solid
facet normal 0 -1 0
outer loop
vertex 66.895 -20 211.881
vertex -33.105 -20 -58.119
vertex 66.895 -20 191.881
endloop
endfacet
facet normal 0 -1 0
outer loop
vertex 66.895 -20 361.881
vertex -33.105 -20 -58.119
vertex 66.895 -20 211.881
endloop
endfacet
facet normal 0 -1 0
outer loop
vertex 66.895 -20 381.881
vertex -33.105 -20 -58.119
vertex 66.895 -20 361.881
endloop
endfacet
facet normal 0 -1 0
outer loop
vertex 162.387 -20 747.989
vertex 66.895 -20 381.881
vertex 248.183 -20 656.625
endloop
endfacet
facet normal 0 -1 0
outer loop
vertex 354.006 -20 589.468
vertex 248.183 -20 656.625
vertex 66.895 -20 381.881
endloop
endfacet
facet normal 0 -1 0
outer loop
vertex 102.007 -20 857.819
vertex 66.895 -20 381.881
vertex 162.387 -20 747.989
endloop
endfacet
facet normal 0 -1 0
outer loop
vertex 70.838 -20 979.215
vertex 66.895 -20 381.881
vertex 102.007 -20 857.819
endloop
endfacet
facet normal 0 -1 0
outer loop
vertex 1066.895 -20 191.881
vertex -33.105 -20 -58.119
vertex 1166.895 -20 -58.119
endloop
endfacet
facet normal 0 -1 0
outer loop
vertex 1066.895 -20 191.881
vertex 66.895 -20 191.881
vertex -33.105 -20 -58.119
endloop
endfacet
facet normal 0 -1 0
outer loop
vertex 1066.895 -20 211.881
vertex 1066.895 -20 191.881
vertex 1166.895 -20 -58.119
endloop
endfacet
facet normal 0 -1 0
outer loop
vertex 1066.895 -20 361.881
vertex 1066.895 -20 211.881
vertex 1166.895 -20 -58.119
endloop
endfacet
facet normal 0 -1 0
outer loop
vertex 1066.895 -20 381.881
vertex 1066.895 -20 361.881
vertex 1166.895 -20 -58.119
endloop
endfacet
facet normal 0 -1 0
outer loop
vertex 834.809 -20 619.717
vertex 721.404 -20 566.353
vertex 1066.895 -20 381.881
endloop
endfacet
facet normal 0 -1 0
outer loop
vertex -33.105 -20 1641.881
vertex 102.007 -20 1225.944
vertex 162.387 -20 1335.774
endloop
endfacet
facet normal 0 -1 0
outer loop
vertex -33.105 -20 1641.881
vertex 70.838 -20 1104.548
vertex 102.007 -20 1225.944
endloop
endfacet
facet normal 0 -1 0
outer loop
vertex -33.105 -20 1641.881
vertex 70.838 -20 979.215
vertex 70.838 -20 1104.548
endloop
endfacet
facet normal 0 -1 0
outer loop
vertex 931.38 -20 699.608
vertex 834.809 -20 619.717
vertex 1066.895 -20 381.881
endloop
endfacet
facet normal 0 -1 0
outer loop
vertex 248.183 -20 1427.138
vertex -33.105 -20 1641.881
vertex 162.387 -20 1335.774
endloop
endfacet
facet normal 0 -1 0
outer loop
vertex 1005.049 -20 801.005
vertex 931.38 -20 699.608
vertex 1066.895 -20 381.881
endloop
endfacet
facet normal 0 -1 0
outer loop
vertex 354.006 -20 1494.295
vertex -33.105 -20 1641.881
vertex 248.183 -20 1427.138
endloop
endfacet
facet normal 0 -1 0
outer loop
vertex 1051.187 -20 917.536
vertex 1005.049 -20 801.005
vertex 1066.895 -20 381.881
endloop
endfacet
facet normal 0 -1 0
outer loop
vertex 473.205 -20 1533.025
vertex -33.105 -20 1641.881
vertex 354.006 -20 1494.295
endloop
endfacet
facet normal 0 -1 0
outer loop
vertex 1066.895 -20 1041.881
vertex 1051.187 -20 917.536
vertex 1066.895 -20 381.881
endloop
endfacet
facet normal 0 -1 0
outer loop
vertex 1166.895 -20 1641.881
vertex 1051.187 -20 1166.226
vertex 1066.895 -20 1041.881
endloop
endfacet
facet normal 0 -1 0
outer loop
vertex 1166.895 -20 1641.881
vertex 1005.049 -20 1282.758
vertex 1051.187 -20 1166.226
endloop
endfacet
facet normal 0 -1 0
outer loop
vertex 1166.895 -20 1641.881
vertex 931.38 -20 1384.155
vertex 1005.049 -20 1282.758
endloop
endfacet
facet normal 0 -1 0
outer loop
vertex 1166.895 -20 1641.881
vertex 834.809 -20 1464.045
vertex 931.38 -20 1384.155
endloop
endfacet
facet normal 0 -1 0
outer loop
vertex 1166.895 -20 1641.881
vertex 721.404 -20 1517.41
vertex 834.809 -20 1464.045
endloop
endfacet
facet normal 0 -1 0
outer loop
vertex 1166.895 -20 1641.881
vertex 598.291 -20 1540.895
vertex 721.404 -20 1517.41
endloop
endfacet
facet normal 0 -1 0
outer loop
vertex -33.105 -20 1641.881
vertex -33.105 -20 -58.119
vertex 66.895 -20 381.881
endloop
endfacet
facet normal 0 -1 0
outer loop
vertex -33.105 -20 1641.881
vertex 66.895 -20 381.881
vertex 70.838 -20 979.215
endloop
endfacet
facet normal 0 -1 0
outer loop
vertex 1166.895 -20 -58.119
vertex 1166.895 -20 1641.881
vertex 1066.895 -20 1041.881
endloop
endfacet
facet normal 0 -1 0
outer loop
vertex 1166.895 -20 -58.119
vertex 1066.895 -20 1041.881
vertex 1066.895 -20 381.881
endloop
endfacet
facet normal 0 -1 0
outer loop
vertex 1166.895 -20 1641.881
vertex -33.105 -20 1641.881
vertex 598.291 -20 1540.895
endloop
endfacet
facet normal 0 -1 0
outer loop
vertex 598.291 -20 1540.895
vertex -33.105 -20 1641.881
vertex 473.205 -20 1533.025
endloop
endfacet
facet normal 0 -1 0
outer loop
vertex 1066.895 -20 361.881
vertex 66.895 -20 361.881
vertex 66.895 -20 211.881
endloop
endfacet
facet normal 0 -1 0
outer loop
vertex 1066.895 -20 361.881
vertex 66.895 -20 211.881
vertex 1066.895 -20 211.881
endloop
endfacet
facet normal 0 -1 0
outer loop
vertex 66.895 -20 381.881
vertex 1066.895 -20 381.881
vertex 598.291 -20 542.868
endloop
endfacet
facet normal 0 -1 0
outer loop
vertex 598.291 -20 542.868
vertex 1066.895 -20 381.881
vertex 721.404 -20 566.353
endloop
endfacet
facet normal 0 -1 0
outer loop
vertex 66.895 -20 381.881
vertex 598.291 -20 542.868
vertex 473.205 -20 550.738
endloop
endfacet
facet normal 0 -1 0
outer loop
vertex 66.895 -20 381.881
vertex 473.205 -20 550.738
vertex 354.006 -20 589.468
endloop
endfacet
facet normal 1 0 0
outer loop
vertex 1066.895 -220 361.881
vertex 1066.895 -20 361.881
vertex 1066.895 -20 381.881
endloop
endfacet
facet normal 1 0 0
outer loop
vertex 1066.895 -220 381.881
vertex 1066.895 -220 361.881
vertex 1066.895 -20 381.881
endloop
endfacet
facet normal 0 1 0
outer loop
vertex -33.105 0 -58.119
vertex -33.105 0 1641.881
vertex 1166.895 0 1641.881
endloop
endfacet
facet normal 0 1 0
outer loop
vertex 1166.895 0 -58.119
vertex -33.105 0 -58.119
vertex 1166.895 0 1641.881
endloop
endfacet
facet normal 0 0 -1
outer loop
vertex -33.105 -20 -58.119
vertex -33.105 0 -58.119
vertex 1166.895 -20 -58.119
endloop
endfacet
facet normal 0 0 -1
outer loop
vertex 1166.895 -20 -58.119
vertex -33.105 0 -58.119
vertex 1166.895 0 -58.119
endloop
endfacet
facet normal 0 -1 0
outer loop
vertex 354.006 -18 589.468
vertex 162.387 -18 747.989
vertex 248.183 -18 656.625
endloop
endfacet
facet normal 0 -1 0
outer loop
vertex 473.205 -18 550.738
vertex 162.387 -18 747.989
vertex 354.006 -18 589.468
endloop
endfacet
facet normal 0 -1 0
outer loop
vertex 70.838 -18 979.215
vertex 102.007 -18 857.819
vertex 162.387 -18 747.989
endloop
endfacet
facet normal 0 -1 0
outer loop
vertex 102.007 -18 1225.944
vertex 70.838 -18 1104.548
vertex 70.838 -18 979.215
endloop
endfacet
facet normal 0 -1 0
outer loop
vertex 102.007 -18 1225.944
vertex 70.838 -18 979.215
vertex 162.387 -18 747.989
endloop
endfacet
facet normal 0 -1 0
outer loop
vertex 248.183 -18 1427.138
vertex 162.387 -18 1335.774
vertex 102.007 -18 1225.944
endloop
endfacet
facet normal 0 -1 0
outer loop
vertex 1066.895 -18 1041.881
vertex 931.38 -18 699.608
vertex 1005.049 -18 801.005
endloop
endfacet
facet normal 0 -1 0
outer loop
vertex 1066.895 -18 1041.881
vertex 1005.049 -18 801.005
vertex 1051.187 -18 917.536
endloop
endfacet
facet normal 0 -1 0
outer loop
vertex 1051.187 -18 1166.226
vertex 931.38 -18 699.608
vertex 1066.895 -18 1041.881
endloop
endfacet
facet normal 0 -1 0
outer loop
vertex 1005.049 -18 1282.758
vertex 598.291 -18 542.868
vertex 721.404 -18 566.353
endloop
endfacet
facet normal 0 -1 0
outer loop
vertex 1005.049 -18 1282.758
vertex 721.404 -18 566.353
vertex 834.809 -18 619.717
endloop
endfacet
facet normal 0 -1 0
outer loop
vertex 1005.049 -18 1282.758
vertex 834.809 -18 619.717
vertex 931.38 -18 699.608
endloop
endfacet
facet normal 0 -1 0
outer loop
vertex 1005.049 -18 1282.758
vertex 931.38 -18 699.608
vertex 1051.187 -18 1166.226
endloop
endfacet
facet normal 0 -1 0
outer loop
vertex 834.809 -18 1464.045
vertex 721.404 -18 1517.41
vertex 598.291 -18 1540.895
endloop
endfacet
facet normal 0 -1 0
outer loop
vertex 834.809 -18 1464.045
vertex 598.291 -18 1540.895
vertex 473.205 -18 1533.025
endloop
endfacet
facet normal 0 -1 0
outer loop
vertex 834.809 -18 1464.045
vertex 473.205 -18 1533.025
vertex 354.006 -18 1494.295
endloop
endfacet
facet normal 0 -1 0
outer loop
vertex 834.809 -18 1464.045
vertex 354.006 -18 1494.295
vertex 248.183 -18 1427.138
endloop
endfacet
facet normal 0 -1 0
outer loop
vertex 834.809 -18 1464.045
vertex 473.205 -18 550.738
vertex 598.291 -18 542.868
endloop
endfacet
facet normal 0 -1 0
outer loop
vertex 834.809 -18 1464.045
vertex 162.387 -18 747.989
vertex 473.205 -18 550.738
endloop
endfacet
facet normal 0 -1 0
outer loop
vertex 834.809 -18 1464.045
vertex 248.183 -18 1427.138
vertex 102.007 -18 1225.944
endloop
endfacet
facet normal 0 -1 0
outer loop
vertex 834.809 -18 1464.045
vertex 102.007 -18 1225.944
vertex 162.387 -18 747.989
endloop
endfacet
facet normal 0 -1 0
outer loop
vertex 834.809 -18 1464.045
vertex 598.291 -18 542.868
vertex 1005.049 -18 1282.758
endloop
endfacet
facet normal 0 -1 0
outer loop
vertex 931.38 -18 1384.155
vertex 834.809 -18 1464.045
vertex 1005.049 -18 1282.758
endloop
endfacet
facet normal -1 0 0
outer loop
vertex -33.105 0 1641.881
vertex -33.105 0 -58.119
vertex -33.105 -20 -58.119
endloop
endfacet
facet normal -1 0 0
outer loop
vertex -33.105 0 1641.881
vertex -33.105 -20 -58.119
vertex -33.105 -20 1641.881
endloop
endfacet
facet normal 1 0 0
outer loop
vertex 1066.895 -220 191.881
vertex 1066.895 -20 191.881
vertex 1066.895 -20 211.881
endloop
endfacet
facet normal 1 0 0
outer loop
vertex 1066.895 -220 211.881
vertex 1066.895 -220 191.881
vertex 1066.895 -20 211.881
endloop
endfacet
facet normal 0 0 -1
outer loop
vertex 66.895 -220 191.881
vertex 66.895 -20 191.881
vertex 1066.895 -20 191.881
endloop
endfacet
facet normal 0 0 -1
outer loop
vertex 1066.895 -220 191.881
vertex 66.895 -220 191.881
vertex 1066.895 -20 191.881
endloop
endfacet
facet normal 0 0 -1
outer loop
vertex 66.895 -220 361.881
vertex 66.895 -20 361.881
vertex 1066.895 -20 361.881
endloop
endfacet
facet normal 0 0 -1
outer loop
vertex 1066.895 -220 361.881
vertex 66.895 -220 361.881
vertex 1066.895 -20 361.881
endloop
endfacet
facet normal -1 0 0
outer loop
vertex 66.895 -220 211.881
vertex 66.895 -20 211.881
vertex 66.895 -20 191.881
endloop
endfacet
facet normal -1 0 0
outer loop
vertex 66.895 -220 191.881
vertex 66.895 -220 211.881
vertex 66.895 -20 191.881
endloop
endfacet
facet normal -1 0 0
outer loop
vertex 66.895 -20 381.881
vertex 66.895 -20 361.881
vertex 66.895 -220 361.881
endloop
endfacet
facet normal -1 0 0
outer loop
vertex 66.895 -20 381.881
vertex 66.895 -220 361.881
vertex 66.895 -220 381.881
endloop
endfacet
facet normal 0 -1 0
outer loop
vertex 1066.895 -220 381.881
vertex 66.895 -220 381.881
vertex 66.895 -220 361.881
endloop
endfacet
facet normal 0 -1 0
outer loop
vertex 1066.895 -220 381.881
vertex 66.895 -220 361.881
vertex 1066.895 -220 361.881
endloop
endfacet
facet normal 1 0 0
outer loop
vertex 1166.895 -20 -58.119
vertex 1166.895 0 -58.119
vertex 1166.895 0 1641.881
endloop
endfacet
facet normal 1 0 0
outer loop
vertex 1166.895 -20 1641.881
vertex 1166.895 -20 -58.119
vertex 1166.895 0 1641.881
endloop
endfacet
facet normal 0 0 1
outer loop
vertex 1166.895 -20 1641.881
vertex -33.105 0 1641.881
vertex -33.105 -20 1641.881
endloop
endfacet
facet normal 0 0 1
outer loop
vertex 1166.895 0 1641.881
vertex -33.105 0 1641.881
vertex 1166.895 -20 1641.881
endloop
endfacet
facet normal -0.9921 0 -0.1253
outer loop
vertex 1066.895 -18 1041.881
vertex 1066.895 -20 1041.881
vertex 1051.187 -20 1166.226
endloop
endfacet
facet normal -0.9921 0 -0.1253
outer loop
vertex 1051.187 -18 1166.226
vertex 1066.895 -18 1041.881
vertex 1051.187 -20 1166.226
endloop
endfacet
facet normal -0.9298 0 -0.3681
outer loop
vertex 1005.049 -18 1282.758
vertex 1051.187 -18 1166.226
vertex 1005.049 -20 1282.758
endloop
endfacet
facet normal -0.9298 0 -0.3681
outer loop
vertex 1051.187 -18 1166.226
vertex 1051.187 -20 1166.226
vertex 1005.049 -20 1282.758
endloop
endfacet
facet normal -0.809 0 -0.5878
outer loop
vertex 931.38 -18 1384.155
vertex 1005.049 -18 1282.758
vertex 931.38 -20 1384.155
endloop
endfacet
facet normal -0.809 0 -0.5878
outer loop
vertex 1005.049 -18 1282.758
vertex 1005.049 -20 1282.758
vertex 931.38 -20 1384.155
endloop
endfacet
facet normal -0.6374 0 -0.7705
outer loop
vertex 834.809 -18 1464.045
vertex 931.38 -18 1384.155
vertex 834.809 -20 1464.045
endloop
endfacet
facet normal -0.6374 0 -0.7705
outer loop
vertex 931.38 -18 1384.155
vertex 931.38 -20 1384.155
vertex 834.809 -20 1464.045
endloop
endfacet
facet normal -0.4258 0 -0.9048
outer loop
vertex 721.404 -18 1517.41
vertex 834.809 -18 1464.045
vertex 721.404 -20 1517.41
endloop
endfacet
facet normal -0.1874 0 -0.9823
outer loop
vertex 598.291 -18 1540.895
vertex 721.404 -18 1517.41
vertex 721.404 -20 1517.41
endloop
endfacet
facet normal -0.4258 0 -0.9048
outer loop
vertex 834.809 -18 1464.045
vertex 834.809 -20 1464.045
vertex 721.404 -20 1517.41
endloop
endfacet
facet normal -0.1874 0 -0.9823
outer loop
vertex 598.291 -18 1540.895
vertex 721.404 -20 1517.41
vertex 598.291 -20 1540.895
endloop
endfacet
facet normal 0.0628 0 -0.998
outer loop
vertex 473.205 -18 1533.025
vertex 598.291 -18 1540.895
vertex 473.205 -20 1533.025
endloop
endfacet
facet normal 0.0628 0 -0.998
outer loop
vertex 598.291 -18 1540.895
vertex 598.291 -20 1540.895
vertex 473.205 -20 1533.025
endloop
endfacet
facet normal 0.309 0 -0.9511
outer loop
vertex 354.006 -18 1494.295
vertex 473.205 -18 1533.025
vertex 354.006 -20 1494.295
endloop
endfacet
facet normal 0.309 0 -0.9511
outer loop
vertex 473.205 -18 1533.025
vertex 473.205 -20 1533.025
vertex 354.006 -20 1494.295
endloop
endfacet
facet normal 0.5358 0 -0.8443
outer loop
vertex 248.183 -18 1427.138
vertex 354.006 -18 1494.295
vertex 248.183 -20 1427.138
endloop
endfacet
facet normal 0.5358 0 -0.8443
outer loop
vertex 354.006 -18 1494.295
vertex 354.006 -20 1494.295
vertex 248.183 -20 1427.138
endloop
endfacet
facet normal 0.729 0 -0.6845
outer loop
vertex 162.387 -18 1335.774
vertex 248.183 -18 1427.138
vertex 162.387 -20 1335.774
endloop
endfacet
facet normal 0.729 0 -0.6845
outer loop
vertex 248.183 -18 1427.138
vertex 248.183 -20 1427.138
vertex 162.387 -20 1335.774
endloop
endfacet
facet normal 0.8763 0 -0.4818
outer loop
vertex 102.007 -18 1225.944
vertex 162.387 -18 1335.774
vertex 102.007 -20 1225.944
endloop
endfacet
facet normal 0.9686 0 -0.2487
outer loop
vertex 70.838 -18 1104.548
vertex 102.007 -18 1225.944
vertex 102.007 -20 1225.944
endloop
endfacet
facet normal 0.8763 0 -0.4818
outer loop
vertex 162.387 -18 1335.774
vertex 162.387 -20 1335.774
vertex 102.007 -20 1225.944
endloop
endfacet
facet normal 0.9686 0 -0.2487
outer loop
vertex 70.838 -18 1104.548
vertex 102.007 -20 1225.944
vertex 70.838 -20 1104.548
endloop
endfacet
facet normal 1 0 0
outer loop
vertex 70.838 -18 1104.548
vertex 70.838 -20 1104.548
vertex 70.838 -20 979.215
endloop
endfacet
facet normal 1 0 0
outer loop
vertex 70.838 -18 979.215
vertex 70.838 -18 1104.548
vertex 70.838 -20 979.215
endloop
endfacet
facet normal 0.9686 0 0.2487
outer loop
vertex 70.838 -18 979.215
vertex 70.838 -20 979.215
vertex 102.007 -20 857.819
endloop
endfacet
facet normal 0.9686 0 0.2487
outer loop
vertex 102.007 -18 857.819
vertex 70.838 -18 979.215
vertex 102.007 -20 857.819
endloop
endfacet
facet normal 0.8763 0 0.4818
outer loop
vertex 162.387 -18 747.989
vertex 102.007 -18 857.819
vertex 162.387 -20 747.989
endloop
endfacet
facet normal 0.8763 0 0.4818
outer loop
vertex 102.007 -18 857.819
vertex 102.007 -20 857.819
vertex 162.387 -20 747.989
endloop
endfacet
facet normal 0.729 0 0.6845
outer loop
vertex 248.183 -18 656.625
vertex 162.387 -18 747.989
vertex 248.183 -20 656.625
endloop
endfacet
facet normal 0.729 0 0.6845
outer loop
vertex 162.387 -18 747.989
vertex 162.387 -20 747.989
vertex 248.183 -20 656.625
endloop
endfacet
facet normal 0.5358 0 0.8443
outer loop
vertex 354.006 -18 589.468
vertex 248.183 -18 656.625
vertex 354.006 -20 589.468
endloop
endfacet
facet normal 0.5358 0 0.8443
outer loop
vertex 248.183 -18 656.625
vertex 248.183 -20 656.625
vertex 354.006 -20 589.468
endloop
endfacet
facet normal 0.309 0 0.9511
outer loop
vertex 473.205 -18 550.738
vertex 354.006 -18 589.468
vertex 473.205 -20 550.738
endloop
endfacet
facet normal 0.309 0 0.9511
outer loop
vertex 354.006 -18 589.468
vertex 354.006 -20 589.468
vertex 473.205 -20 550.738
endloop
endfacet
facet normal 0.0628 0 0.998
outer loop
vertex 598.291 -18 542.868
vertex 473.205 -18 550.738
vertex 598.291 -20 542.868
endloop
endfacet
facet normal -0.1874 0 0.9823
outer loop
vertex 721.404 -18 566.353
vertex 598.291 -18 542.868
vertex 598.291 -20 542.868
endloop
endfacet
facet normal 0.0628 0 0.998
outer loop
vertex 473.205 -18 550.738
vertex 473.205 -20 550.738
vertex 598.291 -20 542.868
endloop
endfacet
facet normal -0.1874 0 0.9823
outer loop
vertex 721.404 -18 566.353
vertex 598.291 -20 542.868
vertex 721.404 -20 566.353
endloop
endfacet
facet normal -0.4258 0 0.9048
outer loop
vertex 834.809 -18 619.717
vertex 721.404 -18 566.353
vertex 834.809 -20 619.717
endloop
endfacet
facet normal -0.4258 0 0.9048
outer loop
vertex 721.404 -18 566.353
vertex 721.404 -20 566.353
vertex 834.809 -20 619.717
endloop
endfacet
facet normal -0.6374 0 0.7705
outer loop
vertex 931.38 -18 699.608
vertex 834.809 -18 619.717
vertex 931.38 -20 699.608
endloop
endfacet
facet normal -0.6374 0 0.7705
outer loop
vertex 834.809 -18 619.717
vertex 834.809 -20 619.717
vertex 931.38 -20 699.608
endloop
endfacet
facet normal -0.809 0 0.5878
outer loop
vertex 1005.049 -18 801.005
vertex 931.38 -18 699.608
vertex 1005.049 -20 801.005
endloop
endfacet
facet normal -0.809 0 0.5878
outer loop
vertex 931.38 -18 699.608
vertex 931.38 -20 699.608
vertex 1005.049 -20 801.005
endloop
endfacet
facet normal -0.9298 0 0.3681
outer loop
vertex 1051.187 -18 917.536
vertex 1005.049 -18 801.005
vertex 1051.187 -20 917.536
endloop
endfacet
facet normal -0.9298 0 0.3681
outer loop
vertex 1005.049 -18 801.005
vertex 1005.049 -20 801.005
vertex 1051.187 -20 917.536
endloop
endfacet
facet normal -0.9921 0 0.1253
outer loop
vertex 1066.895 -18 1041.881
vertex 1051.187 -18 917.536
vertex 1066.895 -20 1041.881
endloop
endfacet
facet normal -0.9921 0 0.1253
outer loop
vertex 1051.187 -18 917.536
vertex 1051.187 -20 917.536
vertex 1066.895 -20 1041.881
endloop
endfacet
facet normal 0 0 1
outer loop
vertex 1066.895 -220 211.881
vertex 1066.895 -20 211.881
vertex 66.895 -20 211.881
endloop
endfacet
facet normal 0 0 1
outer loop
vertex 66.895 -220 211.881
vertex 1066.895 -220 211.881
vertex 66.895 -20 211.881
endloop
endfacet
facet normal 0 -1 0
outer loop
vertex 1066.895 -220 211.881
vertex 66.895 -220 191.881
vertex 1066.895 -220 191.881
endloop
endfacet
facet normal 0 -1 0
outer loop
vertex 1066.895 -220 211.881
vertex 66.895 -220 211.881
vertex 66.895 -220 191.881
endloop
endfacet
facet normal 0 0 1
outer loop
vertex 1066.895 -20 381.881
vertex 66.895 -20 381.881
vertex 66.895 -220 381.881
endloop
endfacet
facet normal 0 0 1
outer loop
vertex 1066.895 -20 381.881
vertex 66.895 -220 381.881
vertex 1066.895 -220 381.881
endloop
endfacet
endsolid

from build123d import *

# Parameters (mm, degrees)
F0_W     = 1200
F0_H     = 1700
F1_DEPTH = 20
F2_R     = 500
F3_DEPTH = 2
F4_W     = 1000
F4_H     = 20
F5_DEPTH = 200


with BuildPart() as f1:
    # F0 (on Front) → F1 (new body)
    with BuildSketch(Plane.XZ):
        with Locations((566.895331, 791.881418)):
            Rectangle(F0_W, F0_H)
    extrude(amount=F1_DEPTH)

    # F2 (on face) → F3 (cut)
    with BuildSketch(Plane.XZ.offset(20)):
        with Locations((566.895331, 1041.881418)):
            Circle(F2_R)
    extrude(amount=-F3_DEPTH, mode=Mode.SUBTRACT)

    # F4 (on face) → F5 (join)
    with BuildSketch(Plane.XZ.offset(20)):
        Polygon((66.895331, 191.881418), (566.895331, 191.881418), (1066.895331, 191.881418), (1066.895331, 211.881418), (66.895331, 211.881418), align=None)
        with Locations((566.895331, 371.881418)):
            Rectangle(F4_W, F4_H)
    extrude(amount=F5_DEPTH)


solid = f1.part
